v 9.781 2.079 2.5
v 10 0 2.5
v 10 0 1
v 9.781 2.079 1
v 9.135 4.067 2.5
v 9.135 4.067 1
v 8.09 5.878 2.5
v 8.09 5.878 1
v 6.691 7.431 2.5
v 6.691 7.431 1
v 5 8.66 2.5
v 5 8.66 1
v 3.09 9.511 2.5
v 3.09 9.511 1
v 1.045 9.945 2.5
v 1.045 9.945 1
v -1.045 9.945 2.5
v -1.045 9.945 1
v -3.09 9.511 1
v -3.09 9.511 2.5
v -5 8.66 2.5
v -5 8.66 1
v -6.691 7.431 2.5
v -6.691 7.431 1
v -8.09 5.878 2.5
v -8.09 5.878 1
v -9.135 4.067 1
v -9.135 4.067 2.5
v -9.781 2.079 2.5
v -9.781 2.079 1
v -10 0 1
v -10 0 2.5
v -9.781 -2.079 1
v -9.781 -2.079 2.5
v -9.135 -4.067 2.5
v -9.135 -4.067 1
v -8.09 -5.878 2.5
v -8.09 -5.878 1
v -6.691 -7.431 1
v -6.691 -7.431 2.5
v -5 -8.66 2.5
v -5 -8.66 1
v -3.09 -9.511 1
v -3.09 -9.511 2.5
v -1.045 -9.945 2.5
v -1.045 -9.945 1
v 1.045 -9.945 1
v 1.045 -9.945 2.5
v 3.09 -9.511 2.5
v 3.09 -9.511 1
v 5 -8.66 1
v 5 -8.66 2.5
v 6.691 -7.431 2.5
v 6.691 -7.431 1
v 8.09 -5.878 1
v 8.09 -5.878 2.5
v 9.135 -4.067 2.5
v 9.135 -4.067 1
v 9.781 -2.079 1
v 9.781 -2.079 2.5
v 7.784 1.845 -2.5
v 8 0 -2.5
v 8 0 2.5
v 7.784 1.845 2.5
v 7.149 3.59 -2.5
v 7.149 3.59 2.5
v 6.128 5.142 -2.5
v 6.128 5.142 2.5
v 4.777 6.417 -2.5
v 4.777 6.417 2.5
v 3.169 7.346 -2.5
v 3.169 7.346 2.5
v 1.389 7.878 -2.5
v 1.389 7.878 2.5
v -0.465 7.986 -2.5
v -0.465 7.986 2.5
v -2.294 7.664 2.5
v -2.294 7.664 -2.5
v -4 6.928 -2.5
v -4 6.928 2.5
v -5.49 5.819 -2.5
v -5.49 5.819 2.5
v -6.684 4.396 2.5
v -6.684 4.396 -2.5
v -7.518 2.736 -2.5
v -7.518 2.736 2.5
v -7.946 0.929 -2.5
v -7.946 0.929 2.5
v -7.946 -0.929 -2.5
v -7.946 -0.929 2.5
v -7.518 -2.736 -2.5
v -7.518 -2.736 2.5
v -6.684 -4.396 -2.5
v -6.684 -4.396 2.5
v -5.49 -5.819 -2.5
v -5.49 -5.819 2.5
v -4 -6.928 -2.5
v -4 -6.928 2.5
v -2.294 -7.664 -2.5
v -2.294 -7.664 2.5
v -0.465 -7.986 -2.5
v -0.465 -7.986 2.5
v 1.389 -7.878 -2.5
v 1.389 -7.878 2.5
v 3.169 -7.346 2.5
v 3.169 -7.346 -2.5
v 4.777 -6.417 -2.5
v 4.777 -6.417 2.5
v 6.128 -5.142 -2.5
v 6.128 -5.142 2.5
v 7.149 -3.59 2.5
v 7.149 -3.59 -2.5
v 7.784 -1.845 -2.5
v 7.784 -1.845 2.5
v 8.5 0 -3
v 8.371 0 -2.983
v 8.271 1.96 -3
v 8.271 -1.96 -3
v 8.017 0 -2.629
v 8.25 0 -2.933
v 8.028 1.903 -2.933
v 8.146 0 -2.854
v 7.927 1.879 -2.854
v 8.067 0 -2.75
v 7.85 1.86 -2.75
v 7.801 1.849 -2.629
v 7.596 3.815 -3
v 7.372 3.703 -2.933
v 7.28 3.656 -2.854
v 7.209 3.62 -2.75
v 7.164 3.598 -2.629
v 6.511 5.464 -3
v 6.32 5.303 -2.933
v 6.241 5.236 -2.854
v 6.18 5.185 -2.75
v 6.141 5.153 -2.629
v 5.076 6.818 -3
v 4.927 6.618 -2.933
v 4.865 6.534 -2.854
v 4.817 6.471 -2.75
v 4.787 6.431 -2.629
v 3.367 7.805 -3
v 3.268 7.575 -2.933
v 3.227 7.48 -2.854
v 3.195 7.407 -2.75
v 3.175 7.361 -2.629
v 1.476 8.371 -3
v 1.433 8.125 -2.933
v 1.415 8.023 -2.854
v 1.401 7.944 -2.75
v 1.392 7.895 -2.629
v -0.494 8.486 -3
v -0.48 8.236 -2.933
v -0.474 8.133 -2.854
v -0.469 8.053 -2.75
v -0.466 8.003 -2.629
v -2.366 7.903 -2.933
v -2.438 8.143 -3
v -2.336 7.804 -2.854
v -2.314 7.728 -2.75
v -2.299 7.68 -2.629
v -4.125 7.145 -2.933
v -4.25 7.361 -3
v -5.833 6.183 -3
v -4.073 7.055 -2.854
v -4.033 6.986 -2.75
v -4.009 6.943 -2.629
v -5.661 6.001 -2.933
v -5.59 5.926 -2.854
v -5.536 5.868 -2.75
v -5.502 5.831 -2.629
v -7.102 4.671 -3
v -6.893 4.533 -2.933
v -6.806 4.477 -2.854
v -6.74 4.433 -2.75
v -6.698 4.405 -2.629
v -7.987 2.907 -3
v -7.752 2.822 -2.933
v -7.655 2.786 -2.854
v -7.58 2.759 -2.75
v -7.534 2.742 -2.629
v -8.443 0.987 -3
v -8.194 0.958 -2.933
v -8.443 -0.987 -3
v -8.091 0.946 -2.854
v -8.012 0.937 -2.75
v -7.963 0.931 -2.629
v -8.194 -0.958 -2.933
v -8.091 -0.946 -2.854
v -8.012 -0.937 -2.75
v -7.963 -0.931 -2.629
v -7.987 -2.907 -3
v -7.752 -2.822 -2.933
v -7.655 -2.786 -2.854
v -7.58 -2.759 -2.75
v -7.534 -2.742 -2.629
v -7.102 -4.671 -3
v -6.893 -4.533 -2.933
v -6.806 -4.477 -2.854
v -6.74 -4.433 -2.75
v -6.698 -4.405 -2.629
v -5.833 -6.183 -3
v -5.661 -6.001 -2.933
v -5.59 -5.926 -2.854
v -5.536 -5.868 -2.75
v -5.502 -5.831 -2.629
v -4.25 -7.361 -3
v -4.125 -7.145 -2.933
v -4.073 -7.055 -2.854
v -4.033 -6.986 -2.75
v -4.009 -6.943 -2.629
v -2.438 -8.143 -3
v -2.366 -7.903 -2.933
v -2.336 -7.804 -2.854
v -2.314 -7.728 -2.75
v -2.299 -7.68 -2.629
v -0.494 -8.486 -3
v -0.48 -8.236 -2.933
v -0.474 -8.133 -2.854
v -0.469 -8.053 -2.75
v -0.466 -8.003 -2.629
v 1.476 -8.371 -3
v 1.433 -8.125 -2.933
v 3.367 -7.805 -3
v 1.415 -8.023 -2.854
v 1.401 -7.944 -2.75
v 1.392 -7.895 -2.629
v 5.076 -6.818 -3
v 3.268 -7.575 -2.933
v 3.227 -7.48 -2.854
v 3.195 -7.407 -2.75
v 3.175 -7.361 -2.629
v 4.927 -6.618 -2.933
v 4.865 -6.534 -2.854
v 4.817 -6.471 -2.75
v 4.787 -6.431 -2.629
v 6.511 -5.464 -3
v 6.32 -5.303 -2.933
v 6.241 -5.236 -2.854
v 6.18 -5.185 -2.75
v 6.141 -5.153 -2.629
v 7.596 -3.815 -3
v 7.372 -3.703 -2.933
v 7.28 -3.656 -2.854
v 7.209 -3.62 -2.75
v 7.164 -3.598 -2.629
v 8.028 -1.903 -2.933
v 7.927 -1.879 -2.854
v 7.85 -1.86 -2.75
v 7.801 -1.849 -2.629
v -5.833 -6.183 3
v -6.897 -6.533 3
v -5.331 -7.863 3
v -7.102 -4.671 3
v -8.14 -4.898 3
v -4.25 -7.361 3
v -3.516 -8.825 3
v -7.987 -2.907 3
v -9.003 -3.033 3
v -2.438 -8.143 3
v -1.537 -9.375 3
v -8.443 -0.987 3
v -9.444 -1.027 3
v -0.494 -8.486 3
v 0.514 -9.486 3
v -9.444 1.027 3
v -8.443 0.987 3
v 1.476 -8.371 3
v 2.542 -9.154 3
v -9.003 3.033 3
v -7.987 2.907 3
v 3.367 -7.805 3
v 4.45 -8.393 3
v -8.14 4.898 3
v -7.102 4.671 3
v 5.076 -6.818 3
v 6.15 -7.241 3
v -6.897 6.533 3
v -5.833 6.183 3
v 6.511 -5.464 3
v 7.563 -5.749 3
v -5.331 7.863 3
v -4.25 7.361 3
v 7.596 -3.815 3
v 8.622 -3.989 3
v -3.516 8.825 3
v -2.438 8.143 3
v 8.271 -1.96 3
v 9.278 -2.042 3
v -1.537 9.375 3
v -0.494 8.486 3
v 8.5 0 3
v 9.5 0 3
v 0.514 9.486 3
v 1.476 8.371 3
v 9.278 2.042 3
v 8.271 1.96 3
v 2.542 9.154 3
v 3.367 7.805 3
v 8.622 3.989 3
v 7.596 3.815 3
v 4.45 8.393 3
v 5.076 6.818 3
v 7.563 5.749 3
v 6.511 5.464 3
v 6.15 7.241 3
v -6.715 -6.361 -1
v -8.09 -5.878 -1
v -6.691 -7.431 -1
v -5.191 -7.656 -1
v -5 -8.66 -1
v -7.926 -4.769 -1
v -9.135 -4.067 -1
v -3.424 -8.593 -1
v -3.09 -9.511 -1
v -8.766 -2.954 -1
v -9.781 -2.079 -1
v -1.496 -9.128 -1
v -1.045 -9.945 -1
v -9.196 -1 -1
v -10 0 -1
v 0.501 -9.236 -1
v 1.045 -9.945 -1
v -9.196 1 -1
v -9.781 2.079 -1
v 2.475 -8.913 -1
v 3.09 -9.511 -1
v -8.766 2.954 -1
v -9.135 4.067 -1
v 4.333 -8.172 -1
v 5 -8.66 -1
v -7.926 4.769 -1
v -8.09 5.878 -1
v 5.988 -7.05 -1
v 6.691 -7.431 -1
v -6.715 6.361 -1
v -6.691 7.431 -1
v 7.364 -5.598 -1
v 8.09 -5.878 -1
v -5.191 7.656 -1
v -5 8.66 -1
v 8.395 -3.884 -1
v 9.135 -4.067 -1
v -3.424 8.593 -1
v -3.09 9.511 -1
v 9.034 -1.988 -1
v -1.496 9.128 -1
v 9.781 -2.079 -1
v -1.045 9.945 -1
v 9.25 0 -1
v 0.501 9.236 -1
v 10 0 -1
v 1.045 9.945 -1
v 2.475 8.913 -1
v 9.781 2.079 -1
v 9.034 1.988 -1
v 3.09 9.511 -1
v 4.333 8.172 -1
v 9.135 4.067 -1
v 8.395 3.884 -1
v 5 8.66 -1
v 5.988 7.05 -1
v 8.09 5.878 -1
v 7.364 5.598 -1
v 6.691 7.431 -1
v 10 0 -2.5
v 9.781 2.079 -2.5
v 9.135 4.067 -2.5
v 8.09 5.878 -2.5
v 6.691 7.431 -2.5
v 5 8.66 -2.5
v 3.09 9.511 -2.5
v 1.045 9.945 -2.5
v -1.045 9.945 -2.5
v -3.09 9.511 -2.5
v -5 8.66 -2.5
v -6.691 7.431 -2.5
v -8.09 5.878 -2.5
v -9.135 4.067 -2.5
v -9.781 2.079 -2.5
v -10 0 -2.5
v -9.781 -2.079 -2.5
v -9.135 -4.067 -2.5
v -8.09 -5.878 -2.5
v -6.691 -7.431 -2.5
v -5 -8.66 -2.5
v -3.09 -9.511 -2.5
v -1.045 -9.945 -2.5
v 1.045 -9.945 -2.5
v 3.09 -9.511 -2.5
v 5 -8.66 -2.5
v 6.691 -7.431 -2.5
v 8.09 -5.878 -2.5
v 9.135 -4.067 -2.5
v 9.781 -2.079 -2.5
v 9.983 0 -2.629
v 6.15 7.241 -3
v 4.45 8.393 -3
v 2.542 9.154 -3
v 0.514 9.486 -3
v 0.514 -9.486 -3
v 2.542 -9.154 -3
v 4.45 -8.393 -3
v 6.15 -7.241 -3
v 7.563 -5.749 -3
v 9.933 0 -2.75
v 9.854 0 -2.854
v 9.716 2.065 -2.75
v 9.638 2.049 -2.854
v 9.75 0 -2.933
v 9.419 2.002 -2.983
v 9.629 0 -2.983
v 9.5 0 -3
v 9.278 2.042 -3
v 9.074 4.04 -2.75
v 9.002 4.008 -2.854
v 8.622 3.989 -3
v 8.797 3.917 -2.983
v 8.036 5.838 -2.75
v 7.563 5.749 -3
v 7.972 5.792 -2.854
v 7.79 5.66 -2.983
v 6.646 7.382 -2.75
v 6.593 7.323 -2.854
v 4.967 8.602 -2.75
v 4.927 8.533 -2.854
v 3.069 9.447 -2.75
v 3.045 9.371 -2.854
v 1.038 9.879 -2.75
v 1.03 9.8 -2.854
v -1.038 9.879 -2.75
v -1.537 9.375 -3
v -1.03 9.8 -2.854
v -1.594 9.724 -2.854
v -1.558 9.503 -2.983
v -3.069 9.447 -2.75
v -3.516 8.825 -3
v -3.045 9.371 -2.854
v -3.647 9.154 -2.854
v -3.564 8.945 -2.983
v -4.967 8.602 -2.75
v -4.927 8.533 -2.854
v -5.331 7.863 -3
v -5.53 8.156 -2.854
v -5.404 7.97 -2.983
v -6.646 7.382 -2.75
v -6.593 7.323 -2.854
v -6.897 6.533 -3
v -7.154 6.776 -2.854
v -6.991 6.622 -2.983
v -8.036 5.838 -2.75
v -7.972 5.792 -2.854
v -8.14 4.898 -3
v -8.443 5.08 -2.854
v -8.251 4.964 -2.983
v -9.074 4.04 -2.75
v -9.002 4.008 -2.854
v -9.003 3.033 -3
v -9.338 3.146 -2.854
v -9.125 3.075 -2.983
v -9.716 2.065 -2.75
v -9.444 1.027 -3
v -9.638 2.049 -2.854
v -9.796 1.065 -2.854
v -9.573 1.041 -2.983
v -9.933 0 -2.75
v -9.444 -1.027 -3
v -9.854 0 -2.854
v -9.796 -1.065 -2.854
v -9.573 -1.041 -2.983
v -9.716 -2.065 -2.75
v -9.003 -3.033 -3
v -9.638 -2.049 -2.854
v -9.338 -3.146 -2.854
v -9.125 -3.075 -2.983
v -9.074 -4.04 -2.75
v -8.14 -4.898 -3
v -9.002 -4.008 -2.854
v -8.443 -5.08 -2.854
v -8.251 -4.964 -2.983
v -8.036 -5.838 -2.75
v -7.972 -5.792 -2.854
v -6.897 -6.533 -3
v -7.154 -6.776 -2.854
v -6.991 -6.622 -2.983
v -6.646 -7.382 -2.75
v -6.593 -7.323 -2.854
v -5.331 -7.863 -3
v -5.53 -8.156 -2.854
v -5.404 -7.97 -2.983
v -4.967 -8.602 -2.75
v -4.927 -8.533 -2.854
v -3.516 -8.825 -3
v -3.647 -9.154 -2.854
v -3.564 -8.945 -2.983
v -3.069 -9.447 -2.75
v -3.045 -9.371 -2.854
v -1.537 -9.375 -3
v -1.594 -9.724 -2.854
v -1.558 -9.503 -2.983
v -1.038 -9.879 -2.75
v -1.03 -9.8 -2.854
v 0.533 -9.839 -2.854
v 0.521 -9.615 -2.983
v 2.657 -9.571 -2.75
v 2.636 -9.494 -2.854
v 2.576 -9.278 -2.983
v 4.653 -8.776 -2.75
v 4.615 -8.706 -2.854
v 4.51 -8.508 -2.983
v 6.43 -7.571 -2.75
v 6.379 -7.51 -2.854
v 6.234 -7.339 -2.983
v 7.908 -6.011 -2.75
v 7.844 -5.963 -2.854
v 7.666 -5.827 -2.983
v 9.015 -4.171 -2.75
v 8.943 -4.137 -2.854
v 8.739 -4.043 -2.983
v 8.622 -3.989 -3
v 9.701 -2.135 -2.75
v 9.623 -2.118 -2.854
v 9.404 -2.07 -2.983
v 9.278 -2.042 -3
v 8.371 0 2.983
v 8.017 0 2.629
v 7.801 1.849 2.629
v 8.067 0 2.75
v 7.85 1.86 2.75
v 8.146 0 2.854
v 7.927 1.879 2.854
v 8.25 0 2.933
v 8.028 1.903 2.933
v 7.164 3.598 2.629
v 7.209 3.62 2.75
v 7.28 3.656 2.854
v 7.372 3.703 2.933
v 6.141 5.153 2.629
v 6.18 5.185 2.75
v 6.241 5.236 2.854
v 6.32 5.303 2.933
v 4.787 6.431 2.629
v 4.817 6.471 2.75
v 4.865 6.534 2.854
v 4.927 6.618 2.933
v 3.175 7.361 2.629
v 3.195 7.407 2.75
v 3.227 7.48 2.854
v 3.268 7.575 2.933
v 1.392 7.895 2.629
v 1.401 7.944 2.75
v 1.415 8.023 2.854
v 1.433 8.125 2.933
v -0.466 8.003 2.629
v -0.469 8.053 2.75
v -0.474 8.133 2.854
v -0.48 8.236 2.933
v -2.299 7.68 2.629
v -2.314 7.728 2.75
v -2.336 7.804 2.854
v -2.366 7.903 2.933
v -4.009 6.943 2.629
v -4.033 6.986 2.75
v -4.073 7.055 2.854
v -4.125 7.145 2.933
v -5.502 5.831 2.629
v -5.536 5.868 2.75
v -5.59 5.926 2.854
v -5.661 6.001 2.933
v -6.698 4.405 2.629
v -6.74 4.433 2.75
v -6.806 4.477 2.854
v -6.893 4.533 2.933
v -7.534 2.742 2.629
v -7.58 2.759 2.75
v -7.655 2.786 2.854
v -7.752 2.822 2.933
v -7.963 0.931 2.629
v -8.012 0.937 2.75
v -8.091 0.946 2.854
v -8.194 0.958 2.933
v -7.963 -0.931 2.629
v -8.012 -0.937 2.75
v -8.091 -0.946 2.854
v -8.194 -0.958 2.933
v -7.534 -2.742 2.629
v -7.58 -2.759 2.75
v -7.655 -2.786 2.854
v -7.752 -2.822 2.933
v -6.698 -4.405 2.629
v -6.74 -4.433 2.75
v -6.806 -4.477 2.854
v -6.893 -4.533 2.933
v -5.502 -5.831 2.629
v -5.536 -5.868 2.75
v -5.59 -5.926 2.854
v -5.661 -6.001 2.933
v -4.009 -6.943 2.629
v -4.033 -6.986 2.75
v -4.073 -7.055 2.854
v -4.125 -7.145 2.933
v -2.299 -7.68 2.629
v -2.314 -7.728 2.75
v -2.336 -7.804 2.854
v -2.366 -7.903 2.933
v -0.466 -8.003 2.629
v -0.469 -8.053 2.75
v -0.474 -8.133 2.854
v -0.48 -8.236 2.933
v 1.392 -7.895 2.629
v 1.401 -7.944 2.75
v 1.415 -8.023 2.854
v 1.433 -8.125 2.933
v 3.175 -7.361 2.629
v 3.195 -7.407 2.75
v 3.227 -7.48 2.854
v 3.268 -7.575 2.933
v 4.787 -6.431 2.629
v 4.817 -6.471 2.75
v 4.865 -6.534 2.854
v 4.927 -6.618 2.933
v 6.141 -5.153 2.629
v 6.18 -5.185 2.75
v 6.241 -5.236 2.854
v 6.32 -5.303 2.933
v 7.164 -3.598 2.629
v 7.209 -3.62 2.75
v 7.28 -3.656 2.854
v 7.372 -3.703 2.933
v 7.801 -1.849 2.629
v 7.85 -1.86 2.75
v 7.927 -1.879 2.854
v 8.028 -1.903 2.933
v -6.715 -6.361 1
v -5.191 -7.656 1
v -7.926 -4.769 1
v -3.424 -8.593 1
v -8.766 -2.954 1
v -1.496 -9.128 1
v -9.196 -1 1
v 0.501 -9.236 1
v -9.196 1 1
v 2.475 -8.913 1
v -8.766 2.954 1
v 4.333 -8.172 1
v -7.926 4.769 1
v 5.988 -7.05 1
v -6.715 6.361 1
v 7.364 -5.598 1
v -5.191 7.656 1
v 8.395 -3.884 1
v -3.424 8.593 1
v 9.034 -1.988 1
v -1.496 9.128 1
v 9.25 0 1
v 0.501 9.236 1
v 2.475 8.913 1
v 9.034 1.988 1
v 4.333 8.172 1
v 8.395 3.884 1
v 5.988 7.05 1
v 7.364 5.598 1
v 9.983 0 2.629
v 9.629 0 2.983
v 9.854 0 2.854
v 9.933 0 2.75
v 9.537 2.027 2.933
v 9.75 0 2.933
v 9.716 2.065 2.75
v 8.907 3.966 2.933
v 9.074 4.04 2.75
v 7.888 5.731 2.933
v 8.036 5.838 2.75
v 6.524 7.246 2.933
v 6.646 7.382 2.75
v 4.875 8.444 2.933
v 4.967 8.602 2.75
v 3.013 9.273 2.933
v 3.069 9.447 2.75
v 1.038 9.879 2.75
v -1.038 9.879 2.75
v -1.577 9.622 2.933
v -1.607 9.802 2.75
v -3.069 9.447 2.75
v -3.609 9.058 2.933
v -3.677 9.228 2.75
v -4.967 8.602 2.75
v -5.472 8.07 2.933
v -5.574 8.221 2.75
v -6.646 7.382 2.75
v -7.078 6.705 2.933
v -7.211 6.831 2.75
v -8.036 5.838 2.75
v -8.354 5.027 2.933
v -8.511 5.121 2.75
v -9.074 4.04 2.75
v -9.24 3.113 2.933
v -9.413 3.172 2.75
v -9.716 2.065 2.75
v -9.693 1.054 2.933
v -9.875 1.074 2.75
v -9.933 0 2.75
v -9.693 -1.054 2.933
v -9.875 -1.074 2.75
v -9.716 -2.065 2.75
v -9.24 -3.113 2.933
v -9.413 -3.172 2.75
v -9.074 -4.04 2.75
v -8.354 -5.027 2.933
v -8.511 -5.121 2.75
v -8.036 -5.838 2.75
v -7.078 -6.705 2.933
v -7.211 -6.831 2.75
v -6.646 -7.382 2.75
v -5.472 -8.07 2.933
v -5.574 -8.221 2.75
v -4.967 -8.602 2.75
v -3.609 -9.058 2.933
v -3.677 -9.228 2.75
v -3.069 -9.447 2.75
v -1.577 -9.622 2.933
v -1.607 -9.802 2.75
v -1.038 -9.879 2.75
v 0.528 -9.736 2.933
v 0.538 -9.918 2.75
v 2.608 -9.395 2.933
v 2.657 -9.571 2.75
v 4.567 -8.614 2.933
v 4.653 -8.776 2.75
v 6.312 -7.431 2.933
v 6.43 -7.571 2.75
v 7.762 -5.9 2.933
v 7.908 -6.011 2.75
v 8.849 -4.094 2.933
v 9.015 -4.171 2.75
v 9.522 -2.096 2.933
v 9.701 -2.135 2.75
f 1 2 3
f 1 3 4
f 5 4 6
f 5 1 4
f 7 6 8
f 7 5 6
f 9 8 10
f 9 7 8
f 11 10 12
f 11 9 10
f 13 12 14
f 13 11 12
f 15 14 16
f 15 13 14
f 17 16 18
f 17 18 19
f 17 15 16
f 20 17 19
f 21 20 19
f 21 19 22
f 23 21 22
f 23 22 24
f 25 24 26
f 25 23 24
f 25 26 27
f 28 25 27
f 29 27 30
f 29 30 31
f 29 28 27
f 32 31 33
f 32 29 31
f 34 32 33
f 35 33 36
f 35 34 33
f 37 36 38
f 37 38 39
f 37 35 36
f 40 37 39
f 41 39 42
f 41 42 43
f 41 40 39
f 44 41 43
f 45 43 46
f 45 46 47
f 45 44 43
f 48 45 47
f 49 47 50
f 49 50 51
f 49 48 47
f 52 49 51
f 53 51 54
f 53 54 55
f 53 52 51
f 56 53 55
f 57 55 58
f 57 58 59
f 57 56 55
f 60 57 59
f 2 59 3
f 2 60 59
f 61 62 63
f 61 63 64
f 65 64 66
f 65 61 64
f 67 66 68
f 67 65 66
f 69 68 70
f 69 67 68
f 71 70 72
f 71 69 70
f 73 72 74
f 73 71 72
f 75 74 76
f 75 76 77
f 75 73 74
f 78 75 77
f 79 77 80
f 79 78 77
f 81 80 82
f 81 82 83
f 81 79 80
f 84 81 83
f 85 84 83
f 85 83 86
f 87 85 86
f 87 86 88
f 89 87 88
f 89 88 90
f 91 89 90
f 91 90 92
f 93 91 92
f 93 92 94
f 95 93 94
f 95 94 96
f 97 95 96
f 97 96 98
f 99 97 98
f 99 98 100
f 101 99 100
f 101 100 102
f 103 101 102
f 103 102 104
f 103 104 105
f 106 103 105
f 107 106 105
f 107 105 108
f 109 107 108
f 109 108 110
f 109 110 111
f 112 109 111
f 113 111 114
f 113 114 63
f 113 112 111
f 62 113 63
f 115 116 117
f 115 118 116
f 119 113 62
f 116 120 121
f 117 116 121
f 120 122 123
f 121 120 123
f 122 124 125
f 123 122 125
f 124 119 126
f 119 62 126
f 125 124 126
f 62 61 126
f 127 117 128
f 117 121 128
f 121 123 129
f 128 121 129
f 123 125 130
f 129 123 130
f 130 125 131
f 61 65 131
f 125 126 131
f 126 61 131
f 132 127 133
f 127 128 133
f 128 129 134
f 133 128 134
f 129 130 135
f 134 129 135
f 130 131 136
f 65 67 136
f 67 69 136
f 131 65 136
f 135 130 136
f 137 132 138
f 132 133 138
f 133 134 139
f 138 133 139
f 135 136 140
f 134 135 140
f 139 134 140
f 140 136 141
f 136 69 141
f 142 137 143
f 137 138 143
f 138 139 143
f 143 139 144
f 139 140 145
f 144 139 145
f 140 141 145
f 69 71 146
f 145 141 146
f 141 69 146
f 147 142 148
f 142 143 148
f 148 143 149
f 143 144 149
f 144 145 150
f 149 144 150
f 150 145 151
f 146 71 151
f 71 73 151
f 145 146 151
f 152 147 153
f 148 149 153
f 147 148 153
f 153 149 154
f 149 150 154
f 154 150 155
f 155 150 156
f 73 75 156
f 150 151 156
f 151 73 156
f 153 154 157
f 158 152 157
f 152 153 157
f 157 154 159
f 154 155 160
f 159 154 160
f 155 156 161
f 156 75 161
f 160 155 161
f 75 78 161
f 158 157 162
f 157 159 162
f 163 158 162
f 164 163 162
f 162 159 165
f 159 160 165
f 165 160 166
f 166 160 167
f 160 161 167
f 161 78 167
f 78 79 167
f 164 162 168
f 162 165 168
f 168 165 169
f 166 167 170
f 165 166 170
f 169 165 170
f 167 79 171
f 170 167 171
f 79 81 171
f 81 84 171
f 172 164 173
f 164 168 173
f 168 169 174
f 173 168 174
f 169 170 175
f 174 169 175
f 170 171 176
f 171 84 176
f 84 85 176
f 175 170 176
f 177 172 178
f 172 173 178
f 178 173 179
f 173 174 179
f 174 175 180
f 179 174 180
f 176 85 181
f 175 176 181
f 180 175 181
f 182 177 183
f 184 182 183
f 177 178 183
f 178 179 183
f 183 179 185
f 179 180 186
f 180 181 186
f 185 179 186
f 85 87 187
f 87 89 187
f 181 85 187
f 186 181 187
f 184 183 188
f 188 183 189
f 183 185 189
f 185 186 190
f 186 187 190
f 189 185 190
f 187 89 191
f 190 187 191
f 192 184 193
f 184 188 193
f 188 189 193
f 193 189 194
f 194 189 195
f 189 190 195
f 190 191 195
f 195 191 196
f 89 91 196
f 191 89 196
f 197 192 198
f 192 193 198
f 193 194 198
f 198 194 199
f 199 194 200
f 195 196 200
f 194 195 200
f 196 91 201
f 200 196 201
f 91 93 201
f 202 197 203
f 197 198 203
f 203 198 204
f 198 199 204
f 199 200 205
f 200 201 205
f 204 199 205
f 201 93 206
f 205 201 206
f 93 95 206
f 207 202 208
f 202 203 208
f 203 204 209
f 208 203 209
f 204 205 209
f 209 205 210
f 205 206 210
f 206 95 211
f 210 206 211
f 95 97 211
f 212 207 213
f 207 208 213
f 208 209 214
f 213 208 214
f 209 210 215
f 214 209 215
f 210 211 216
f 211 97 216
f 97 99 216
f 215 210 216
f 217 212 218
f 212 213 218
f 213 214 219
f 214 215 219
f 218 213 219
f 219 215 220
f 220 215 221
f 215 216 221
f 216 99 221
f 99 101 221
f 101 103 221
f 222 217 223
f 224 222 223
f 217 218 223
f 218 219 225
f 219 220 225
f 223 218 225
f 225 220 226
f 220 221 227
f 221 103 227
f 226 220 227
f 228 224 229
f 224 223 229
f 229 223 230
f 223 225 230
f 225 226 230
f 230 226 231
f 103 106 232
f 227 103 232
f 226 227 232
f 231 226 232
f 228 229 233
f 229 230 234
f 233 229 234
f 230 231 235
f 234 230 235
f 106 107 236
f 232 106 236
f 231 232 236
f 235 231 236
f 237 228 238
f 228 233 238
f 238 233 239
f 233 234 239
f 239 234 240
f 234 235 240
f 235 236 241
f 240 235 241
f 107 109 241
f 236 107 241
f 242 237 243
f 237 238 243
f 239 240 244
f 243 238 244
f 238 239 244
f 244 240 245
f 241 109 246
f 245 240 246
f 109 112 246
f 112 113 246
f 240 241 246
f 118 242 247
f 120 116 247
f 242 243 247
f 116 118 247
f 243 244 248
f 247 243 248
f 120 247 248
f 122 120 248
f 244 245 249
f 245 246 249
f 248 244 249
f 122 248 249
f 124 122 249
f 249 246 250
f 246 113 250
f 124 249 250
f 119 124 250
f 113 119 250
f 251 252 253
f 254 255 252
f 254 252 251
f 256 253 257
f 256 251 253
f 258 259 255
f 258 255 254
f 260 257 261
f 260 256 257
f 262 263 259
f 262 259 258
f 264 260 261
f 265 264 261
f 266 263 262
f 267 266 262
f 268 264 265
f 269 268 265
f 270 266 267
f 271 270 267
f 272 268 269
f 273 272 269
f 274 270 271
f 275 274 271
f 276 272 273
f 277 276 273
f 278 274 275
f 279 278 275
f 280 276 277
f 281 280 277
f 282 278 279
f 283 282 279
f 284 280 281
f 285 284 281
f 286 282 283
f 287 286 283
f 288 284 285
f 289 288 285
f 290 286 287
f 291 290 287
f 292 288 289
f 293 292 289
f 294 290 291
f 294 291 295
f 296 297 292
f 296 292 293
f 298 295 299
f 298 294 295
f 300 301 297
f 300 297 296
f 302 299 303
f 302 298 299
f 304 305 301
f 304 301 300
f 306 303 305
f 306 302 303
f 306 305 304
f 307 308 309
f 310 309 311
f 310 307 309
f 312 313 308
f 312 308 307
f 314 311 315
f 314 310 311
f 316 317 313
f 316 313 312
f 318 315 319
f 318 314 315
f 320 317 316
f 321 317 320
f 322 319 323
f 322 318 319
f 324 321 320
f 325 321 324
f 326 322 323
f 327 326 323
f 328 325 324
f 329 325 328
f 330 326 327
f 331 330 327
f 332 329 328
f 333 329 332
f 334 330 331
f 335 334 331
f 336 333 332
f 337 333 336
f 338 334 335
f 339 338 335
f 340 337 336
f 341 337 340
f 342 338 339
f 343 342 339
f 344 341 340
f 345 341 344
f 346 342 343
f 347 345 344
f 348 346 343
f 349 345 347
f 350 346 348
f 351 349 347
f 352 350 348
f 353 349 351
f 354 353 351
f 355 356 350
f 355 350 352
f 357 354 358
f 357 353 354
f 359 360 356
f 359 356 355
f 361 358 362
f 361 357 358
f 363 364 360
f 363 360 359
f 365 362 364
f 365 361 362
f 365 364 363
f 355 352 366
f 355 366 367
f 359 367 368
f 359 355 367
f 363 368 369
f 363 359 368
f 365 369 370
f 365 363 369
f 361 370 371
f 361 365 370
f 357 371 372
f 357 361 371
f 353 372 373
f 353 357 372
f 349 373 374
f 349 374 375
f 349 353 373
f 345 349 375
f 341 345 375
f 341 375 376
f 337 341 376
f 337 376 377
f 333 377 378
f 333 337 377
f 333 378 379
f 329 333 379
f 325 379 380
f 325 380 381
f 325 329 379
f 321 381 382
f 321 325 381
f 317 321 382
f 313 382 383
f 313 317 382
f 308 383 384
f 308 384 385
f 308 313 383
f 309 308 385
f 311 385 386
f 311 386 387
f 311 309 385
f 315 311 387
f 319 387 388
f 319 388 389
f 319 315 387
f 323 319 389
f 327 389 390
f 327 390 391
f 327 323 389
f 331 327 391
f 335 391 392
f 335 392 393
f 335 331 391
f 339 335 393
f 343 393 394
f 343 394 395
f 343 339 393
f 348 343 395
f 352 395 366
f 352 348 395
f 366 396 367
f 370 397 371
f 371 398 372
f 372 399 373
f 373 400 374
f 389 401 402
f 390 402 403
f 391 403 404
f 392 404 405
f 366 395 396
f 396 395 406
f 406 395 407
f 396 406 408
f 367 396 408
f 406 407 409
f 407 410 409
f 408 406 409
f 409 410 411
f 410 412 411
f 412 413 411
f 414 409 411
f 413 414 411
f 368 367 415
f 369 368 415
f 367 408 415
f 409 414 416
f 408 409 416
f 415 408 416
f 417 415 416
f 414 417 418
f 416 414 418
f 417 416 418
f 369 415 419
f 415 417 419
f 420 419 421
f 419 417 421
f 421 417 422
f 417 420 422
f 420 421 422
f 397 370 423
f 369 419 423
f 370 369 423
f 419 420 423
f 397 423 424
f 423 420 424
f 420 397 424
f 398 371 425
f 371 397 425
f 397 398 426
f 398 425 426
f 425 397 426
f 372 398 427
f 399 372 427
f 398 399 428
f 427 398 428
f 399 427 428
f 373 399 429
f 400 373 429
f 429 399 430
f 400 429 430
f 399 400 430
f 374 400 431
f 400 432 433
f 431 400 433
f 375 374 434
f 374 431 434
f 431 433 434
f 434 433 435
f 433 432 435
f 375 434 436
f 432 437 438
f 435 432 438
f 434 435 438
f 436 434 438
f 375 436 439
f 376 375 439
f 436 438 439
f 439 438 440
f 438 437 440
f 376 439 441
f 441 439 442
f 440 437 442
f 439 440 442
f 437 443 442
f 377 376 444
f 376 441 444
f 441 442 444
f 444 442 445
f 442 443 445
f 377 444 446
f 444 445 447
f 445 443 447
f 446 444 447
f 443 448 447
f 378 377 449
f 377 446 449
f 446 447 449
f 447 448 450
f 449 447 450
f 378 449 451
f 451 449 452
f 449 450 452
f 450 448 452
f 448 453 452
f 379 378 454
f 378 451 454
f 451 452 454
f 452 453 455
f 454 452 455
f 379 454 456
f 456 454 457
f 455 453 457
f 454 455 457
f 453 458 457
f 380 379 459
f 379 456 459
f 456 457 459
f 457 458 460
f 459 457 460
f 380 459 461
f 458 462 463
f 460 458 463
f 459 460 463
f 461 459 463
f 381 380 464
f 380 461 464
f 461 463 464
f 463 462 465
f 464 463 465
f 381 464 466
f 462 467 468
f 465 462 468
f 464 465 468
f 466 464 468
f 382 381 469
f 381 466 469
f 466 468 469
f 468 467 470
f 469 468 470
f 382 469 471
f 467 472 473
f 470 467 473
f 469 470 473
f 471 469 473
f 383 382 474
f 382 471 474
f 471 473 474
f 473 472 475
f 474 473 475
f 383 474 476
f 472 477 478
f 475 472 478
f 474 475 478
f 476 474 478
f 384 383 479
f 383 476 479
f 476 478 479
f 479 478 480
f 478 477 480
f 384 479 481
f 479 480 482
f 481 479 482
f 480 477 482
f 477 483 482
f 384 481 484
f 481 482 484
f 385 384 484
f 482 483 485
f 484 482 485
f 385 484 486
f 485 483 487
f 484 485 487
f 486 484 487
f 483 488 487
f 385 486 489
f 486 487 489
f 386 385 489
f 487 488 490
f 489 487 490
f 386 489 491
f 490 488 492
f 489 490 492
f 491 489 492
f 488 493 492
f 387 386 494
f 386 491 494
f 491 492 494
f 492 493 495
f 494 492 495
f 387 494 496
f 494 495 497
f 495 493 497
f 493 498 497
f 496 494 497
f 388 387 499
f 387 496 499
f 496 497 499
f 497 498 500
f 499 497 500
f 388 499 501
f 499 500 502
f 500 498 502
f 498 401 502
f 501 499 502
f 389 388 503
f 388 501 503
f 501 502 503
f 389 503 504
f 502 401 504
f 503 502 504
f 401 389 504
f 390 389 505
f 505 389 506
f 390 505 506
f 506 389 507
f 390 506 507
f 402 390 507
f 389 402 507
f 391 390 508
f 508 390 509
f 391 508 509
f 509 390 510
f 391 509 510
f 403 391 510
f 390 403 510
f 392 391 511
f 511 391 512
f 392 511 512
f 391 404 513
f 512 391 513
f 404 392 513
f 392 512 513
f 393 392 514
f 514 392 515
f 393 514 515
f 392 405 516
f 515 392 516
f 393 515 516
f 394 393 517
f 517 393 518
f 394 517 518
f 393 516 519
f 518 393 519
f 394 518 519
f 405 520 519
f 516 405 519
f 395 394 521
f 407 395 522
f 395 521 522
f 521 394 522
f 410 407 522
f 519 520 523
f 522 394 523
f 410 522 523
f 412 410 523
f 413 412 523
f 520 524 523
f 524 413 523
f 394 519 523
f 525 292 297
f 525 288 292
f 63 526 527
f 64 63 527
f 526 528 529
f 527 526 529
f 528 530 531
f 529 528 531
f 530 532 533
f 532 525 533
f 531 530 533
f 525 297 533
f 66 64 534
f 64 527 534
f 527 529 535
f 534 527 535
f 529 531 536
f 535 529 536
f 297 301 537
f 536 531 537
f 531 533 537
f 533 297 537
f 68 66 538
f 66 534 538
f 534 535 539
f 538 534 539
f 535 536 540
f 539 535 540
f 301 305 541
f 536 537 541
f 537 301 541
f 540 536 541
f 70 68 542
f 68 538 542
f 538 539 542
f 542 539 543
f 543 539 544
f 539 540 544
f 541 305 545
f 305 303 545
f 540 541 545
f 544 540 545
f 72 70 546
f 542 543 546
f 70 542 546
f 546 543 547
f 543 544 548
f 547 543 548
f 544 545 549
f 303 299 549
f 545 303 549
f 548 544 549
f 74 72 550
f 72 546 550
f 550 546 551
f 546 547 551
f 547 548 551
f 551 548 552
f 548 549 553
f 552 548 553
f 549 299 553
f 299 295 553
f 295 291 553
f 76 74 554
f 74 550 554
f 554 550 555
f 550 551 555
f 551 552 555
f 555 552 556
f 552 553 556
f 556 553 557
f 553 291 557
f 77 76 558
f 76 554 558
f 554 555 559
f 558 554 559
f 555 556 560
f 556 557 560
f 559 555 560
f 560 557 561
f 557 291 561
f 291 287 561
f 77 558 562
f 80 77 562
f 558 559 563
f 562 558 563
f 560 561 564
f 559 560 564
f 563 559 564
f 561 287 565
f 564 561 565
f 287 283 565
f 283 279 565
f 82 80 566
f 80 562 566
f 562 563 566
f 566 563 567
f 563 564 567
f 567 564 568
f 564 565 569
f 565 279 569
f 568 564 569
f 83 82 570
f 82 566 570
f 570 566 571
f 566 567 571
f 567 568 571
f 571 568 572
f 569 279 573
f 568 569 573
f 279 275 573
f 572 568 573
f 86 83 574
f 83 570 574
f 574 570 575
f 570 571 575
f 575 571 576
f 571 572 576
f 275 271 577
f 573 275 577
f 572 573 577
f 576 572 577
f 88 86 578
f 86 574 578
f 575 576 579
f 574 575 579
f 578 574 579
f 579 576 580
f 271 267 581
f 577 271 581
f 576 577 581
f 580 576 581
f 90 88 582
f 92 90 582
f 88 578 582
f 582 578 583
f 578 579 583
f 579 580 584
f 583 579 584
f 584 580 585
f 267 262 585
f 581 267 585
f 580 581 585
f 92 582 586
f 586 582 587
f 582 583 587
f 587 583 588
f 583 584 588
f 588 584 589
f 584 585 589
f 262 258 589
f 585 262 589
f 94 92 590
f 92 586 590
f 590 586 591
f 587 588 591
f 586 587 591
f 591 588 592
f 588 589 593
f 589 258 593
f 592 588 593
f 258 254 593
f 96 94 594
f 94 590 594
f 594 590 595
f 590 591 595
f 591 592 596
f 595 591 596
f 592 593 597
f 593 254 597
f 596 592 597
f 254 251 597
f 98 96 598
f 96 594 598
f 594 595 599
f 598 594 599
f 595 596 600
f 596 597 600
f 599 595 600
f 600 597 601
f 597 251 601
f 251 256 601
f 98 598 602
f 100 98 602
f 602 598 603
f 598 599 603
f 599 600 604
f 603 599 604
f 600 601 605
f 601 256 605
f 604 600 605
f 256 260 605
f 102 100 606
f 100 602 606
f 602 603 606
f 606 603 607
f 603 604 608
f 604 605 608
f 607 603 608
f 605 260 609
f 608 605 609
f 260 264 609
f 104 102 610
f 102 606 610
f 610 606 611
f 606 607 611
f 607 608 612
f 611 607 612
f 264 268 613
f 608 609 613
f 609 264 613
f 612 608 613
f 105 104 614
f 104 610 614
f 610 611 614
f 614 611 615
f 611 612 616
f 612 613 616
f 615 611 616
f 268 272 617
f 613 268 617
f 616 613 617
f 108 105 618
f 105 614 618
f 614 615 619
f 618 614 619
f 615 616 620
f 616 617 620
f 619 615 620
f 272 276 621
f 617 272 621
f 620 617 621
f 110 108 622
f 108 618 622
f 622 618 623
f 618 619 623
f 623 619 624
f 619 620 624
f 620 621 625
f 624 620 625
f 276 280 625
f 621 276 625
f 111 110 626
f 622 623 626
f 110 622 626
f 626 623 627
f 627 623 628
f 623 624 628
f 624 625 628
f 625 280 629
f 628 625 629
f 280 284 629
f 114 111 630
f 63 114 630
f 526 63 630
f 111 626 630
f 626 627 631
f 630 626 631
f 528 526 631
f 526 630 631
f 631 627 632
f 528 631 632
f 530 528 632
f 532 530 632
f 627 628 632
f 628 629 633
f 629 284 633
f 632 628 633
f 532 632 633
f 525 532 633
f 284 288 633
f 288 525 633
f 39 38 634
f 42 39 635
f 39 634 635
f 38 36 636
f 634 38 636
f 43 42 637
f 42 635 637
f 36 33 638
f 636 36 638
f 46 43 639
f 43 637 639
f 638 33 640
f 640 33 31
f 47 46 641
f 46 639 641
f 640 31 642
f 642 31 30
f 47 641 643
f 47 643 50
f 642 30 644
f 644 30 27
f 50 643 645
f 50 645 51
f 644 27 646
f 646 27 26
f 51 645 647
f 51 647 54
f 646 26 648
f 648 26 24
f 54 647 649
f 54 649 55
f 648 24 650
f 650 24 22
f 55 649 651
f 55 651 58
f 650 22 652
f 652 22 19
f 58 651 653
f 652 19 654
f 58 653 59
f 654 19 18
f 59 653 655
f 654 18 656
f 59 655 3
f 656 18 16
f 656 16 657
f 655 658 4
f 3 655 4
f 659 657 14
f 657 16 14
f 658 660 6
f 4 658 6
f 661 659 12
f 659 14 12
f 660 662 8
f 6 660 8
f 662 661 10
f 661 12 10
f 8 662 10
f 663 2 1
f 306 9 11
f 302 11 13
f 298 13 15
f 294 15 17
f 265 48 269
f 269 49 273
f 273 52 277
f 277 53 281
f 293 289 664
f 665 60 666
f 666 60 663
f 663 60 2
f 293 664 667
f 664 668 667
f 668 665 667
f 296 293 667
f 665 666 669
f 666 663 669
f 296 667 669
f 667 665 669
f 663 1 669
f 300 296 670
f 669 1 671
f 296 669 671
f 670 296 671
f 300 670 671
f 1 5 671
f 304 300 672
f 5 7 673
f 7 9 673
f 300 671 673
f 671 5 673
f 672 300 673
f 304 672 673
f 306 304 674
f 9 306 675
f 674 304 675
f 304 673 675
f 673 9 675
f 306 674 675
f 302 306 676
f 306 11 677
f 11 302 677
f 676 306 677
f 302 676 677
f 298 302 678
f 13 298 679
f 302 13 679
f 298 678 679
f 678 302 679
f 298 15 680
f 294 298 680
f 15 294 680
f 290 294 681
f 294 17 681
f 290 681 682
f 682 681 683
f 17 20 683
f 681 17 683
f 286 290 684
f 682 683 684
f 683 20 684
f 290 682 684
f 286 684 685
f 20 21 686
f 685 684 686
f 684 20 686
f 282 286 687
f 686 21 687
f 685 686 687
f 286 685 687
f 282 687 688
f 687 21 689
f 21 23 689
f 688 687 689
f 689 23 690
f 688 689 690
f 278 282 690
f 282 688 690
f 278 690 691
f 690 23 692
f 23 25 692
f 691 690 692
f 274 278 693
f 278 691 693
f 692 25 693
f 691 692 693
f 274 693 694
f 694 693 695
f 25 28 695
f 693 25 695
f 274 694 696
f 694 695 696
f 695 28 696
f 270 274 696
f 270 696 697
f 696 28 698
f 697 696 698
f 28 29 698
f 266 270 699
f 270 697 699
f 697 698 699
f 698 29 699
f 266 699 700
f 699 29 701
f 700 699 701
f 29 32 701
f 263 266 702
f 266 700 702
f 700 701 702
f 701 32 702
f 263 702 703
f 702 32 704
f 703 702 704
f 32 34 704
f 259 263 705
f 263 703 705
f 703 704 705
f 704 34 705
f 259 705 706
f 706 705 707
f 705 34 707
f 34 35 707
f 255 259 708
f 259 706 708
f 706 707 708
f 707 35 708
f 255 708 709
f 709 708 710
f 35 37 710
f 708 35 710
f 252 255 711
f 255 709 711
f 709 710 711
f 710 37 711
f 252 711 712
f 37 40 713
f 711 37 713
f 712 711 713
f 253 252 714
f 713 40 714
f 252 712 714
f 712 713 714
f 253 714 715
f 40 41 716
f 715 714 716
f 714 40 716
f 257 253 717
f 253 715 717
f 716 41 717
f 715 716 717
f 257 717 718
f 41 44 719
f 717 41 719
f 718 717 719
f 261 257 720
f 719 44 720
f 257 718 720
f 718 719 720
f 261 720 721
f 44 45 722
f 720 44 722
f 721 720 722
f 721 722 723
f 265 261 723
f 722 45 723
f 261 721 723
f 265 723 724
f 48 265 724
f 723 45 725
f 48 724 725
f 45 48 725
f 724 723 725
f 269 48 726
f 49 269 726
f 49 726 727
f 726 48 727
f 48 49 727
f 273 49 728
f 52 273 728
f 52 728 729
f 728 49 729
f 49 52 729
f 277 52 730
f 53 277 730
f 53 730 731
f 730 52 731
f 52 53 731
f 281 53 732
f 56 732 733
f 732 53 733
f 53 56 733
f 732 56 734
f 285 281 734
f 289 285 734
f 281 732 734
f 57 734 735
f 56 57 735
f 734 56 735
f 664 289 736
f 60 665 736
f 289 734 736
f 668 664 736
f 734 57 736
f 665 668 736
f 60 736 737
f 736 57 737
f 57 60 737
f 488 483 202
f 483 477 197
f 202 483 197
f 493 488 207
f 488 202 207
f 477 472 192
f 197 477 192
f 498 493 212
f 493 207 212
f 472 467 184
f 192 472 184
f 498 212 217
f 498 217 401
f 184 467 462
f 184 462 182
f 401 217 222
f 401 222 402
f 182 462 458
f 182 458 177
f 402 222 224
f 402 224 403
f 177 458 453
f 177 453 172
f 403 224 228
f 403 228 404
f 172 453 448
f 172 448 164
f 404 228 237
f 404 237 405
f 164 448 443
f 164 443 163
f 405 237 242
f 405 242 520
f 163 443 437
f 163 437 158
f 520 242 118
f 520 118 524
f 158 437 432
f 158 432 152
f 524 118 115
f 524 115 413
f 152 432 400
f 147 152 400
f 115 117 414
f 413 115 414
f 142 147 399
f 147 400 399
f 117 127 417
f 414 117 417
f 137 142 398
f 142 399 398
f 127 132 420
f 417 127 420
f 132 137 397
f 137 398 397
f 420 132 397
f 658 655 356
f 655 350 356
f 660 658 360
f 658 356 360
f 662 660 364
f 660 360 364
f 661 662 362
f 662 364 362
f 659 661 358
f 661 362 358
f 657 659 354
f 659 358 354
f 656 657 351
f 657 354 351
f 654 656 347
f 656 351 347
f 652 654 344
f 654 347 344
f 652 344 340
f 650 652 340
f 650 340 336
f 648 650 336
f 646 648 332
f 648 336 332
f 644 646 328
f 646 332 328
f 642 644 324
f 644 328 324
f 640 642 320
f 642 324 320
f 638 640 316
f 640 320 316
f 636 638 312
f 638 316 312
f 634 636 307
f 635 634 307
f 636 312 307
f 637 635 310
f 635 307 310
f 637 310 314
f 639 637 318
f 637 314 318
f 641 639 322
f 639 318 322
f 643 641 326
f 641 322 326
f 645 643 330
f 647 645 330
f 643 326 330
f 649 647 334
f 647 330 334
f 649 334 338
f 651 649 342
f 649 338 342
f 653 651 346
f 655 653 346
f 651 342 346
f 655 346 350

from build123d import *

# Parameters (mm, degrees)
F0_R     = 10
F0_R_2   = 9.25
F0_R_3   = 8
F1_DEPTH = 3
F2_DEPTH = 1
F3_R     = 0.5


with BuildPart() as f1:
    # F0 (on Top) → F1 (new body, symmetric)
    with BuildSketch(Plane.XY):
        Circle(F0_R)
        Circle(F0_R_2, mode=Mode.SUBTRACT)
        Circle(F0_R_2)
        Circle(F0_R_3, mode=Mode.SUBTRACT)
    extrude(amount=F1_DEPTH, both=True)

    # F0 (on Top) → F2 (cut, symmetric)
    with BuildSketch(Plane.XY):
        Circle(F0_R)
        Circle(F0_R_2, mode=Mode.SUBTRACT)
    extrude(amount=F2_DEPTH, both=True, mode=Mode.SUBTRACT)

    # F3
    f3_edges = [f1.edges().sort_by_distance(p)[0] for p in [
        (-10, 0, 3),
        (-8, 0, 3),
        (-10, 0, -3),
        (-8, 0, -3),
    ]]
    fillet(f3_edges, radius=F3_R)


solid = f1.part
